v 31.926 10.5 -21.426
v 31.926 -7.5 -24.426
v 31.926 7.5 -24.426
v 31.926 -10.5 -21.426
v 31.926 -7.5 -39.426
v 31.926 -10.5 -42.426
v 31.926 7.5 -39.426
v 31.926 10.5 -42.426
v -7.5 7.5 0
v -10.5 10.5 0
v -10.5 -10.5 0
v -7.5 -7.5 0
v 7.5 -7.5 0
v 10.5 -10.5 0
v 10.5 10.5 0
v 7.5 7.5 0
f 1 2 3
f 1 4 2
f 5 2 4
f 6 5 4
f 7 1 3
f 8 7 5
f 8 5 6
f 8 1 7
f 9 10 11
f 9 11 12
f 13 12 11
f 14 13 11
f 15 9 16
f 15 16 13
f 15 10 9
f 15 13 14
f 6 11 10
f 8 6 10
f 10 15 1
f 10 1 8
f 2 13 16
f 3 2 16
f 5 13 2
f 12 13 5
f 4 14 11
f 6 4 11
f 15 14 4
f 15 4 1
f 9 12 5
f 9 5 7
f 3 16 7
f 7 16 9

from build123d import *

# Parameters (mm, degrees)
CROQUIS1_W              = 21
CROQUIS1_H              = 21
CROQUIS1_W_2            = 15
CROQUIS1_H_2            = 15
SALIENTE_EXTRUIR1_DEPTH = 70
CROQUIS6_W              = 21
CROQUIS6_H              = 21
CROQUIS6_W_2            = 15
CROQUIS6_H_2            = 15
SALIENTE_EXTRUIR2_DEPTH = 60
CORTAR_EXTRUIR2_DEPTH   = 91.234165061
CROQUIS8_W              = 21
CROQUIS8_H              = 21
CROQUIS8_W_2            = 15
CROQUIS8_H_2            = 15
SALIENTE_EXTRUIR3_DEPTH = 60
CROQUIS9_W              = 21
CROQUIS9_H              = 70
CROQUIS9_W_2            = 60
CROQUIS9_H_2            = 21
CORTAR_EXTRUIR3_DEPTH   = 118.437065189


with BuildPart() as part:
    # Croquis1 → Saliente-Extruir1 (new body)
    with BuildSketch(Plane.XY):
        Rectangle(CROQUIS1_W, CROQUIS1_H)
        Rectangle(CROQUIS1_W_2, CROQUIS1_H_2, mode=Mode.SUBTRACT)
    extrude(amount=SALIENTE_EXTRUIR1_DEPTH)

    # Croquis6 → Saliente-Extruir2 (add, along a direction that is not the sketch's normal)
    with BuildSketch(Plane(origin=(0, 0, 0), x_dir=(-1, 0, 0), z_dir=(0, 0, -1))):
        Rectangle(CROQUIS6_W, CROQUIS6_H)
        Rectangle(CROQUIS6_W_2, CROQUIS6_H_2, mode=Mode.SUBTRACT)
    extrude(amount=SALIENTE_EXTRUIR2_DEPTH, dir=(0.7071067811865512, 0, -0.7071067811865438))

    # Croquis7 → Cortar-Extruir2 (cut, through all)
    with BuildSketch(Plane(origin=(0, 10.5, 0), x_dir=(1, 0, 0), z_dir=(0, 1, 0))):
        Polygon((31.926406871, 42.426406871), (31.926406871, 21.426406871), (52.926406871, 42.426406871), align=None)
    extrude(amount=-CORTAR_EXTRUIR2_DEPTH, mode=Mode.SUBTRACT)

    # Croquis8 → Saliente-Extruir3 (add)
    with BuildSketch(Plane(origin=(31.926406871, 0, 0), x_dir=(0, 0, -1), z_dir=(1, 0, 0))):
        with Locations((31.926406871, 0)):
            Rectangle(CROQUIS8_W, CROQUIS8_H)
        with Locations((31.926406871, 0)):
            Rectangle(CROQUIS8_W_2, CROQUIS8_H_2, mode=Mode.SUBTRACT)
    extrude(amount=SALIENTE_EXTRUIR3_DEPTH)

    # Croquis9 → Cortar-Extruir3 (cut, through all)
    with BuildSketch(Plane(origin=(0, 10.5, 0), x_dir=(1, 0, 0), z_dir=(0, 1, 0))):
        with Locations((0, -35)):
            Rectangle(CROQUIS9_W, CROQUIS9_H)
        with Locations((61.926406871, 31.926406871)):
            Rectangle(CROQUIS9_W_2, CROQUIS9_H_2)
    extrude(amount=-CORTAR_EXTRUIR3_DEPTH, mode=Mode.SUBTRACT)


solid = part.part
